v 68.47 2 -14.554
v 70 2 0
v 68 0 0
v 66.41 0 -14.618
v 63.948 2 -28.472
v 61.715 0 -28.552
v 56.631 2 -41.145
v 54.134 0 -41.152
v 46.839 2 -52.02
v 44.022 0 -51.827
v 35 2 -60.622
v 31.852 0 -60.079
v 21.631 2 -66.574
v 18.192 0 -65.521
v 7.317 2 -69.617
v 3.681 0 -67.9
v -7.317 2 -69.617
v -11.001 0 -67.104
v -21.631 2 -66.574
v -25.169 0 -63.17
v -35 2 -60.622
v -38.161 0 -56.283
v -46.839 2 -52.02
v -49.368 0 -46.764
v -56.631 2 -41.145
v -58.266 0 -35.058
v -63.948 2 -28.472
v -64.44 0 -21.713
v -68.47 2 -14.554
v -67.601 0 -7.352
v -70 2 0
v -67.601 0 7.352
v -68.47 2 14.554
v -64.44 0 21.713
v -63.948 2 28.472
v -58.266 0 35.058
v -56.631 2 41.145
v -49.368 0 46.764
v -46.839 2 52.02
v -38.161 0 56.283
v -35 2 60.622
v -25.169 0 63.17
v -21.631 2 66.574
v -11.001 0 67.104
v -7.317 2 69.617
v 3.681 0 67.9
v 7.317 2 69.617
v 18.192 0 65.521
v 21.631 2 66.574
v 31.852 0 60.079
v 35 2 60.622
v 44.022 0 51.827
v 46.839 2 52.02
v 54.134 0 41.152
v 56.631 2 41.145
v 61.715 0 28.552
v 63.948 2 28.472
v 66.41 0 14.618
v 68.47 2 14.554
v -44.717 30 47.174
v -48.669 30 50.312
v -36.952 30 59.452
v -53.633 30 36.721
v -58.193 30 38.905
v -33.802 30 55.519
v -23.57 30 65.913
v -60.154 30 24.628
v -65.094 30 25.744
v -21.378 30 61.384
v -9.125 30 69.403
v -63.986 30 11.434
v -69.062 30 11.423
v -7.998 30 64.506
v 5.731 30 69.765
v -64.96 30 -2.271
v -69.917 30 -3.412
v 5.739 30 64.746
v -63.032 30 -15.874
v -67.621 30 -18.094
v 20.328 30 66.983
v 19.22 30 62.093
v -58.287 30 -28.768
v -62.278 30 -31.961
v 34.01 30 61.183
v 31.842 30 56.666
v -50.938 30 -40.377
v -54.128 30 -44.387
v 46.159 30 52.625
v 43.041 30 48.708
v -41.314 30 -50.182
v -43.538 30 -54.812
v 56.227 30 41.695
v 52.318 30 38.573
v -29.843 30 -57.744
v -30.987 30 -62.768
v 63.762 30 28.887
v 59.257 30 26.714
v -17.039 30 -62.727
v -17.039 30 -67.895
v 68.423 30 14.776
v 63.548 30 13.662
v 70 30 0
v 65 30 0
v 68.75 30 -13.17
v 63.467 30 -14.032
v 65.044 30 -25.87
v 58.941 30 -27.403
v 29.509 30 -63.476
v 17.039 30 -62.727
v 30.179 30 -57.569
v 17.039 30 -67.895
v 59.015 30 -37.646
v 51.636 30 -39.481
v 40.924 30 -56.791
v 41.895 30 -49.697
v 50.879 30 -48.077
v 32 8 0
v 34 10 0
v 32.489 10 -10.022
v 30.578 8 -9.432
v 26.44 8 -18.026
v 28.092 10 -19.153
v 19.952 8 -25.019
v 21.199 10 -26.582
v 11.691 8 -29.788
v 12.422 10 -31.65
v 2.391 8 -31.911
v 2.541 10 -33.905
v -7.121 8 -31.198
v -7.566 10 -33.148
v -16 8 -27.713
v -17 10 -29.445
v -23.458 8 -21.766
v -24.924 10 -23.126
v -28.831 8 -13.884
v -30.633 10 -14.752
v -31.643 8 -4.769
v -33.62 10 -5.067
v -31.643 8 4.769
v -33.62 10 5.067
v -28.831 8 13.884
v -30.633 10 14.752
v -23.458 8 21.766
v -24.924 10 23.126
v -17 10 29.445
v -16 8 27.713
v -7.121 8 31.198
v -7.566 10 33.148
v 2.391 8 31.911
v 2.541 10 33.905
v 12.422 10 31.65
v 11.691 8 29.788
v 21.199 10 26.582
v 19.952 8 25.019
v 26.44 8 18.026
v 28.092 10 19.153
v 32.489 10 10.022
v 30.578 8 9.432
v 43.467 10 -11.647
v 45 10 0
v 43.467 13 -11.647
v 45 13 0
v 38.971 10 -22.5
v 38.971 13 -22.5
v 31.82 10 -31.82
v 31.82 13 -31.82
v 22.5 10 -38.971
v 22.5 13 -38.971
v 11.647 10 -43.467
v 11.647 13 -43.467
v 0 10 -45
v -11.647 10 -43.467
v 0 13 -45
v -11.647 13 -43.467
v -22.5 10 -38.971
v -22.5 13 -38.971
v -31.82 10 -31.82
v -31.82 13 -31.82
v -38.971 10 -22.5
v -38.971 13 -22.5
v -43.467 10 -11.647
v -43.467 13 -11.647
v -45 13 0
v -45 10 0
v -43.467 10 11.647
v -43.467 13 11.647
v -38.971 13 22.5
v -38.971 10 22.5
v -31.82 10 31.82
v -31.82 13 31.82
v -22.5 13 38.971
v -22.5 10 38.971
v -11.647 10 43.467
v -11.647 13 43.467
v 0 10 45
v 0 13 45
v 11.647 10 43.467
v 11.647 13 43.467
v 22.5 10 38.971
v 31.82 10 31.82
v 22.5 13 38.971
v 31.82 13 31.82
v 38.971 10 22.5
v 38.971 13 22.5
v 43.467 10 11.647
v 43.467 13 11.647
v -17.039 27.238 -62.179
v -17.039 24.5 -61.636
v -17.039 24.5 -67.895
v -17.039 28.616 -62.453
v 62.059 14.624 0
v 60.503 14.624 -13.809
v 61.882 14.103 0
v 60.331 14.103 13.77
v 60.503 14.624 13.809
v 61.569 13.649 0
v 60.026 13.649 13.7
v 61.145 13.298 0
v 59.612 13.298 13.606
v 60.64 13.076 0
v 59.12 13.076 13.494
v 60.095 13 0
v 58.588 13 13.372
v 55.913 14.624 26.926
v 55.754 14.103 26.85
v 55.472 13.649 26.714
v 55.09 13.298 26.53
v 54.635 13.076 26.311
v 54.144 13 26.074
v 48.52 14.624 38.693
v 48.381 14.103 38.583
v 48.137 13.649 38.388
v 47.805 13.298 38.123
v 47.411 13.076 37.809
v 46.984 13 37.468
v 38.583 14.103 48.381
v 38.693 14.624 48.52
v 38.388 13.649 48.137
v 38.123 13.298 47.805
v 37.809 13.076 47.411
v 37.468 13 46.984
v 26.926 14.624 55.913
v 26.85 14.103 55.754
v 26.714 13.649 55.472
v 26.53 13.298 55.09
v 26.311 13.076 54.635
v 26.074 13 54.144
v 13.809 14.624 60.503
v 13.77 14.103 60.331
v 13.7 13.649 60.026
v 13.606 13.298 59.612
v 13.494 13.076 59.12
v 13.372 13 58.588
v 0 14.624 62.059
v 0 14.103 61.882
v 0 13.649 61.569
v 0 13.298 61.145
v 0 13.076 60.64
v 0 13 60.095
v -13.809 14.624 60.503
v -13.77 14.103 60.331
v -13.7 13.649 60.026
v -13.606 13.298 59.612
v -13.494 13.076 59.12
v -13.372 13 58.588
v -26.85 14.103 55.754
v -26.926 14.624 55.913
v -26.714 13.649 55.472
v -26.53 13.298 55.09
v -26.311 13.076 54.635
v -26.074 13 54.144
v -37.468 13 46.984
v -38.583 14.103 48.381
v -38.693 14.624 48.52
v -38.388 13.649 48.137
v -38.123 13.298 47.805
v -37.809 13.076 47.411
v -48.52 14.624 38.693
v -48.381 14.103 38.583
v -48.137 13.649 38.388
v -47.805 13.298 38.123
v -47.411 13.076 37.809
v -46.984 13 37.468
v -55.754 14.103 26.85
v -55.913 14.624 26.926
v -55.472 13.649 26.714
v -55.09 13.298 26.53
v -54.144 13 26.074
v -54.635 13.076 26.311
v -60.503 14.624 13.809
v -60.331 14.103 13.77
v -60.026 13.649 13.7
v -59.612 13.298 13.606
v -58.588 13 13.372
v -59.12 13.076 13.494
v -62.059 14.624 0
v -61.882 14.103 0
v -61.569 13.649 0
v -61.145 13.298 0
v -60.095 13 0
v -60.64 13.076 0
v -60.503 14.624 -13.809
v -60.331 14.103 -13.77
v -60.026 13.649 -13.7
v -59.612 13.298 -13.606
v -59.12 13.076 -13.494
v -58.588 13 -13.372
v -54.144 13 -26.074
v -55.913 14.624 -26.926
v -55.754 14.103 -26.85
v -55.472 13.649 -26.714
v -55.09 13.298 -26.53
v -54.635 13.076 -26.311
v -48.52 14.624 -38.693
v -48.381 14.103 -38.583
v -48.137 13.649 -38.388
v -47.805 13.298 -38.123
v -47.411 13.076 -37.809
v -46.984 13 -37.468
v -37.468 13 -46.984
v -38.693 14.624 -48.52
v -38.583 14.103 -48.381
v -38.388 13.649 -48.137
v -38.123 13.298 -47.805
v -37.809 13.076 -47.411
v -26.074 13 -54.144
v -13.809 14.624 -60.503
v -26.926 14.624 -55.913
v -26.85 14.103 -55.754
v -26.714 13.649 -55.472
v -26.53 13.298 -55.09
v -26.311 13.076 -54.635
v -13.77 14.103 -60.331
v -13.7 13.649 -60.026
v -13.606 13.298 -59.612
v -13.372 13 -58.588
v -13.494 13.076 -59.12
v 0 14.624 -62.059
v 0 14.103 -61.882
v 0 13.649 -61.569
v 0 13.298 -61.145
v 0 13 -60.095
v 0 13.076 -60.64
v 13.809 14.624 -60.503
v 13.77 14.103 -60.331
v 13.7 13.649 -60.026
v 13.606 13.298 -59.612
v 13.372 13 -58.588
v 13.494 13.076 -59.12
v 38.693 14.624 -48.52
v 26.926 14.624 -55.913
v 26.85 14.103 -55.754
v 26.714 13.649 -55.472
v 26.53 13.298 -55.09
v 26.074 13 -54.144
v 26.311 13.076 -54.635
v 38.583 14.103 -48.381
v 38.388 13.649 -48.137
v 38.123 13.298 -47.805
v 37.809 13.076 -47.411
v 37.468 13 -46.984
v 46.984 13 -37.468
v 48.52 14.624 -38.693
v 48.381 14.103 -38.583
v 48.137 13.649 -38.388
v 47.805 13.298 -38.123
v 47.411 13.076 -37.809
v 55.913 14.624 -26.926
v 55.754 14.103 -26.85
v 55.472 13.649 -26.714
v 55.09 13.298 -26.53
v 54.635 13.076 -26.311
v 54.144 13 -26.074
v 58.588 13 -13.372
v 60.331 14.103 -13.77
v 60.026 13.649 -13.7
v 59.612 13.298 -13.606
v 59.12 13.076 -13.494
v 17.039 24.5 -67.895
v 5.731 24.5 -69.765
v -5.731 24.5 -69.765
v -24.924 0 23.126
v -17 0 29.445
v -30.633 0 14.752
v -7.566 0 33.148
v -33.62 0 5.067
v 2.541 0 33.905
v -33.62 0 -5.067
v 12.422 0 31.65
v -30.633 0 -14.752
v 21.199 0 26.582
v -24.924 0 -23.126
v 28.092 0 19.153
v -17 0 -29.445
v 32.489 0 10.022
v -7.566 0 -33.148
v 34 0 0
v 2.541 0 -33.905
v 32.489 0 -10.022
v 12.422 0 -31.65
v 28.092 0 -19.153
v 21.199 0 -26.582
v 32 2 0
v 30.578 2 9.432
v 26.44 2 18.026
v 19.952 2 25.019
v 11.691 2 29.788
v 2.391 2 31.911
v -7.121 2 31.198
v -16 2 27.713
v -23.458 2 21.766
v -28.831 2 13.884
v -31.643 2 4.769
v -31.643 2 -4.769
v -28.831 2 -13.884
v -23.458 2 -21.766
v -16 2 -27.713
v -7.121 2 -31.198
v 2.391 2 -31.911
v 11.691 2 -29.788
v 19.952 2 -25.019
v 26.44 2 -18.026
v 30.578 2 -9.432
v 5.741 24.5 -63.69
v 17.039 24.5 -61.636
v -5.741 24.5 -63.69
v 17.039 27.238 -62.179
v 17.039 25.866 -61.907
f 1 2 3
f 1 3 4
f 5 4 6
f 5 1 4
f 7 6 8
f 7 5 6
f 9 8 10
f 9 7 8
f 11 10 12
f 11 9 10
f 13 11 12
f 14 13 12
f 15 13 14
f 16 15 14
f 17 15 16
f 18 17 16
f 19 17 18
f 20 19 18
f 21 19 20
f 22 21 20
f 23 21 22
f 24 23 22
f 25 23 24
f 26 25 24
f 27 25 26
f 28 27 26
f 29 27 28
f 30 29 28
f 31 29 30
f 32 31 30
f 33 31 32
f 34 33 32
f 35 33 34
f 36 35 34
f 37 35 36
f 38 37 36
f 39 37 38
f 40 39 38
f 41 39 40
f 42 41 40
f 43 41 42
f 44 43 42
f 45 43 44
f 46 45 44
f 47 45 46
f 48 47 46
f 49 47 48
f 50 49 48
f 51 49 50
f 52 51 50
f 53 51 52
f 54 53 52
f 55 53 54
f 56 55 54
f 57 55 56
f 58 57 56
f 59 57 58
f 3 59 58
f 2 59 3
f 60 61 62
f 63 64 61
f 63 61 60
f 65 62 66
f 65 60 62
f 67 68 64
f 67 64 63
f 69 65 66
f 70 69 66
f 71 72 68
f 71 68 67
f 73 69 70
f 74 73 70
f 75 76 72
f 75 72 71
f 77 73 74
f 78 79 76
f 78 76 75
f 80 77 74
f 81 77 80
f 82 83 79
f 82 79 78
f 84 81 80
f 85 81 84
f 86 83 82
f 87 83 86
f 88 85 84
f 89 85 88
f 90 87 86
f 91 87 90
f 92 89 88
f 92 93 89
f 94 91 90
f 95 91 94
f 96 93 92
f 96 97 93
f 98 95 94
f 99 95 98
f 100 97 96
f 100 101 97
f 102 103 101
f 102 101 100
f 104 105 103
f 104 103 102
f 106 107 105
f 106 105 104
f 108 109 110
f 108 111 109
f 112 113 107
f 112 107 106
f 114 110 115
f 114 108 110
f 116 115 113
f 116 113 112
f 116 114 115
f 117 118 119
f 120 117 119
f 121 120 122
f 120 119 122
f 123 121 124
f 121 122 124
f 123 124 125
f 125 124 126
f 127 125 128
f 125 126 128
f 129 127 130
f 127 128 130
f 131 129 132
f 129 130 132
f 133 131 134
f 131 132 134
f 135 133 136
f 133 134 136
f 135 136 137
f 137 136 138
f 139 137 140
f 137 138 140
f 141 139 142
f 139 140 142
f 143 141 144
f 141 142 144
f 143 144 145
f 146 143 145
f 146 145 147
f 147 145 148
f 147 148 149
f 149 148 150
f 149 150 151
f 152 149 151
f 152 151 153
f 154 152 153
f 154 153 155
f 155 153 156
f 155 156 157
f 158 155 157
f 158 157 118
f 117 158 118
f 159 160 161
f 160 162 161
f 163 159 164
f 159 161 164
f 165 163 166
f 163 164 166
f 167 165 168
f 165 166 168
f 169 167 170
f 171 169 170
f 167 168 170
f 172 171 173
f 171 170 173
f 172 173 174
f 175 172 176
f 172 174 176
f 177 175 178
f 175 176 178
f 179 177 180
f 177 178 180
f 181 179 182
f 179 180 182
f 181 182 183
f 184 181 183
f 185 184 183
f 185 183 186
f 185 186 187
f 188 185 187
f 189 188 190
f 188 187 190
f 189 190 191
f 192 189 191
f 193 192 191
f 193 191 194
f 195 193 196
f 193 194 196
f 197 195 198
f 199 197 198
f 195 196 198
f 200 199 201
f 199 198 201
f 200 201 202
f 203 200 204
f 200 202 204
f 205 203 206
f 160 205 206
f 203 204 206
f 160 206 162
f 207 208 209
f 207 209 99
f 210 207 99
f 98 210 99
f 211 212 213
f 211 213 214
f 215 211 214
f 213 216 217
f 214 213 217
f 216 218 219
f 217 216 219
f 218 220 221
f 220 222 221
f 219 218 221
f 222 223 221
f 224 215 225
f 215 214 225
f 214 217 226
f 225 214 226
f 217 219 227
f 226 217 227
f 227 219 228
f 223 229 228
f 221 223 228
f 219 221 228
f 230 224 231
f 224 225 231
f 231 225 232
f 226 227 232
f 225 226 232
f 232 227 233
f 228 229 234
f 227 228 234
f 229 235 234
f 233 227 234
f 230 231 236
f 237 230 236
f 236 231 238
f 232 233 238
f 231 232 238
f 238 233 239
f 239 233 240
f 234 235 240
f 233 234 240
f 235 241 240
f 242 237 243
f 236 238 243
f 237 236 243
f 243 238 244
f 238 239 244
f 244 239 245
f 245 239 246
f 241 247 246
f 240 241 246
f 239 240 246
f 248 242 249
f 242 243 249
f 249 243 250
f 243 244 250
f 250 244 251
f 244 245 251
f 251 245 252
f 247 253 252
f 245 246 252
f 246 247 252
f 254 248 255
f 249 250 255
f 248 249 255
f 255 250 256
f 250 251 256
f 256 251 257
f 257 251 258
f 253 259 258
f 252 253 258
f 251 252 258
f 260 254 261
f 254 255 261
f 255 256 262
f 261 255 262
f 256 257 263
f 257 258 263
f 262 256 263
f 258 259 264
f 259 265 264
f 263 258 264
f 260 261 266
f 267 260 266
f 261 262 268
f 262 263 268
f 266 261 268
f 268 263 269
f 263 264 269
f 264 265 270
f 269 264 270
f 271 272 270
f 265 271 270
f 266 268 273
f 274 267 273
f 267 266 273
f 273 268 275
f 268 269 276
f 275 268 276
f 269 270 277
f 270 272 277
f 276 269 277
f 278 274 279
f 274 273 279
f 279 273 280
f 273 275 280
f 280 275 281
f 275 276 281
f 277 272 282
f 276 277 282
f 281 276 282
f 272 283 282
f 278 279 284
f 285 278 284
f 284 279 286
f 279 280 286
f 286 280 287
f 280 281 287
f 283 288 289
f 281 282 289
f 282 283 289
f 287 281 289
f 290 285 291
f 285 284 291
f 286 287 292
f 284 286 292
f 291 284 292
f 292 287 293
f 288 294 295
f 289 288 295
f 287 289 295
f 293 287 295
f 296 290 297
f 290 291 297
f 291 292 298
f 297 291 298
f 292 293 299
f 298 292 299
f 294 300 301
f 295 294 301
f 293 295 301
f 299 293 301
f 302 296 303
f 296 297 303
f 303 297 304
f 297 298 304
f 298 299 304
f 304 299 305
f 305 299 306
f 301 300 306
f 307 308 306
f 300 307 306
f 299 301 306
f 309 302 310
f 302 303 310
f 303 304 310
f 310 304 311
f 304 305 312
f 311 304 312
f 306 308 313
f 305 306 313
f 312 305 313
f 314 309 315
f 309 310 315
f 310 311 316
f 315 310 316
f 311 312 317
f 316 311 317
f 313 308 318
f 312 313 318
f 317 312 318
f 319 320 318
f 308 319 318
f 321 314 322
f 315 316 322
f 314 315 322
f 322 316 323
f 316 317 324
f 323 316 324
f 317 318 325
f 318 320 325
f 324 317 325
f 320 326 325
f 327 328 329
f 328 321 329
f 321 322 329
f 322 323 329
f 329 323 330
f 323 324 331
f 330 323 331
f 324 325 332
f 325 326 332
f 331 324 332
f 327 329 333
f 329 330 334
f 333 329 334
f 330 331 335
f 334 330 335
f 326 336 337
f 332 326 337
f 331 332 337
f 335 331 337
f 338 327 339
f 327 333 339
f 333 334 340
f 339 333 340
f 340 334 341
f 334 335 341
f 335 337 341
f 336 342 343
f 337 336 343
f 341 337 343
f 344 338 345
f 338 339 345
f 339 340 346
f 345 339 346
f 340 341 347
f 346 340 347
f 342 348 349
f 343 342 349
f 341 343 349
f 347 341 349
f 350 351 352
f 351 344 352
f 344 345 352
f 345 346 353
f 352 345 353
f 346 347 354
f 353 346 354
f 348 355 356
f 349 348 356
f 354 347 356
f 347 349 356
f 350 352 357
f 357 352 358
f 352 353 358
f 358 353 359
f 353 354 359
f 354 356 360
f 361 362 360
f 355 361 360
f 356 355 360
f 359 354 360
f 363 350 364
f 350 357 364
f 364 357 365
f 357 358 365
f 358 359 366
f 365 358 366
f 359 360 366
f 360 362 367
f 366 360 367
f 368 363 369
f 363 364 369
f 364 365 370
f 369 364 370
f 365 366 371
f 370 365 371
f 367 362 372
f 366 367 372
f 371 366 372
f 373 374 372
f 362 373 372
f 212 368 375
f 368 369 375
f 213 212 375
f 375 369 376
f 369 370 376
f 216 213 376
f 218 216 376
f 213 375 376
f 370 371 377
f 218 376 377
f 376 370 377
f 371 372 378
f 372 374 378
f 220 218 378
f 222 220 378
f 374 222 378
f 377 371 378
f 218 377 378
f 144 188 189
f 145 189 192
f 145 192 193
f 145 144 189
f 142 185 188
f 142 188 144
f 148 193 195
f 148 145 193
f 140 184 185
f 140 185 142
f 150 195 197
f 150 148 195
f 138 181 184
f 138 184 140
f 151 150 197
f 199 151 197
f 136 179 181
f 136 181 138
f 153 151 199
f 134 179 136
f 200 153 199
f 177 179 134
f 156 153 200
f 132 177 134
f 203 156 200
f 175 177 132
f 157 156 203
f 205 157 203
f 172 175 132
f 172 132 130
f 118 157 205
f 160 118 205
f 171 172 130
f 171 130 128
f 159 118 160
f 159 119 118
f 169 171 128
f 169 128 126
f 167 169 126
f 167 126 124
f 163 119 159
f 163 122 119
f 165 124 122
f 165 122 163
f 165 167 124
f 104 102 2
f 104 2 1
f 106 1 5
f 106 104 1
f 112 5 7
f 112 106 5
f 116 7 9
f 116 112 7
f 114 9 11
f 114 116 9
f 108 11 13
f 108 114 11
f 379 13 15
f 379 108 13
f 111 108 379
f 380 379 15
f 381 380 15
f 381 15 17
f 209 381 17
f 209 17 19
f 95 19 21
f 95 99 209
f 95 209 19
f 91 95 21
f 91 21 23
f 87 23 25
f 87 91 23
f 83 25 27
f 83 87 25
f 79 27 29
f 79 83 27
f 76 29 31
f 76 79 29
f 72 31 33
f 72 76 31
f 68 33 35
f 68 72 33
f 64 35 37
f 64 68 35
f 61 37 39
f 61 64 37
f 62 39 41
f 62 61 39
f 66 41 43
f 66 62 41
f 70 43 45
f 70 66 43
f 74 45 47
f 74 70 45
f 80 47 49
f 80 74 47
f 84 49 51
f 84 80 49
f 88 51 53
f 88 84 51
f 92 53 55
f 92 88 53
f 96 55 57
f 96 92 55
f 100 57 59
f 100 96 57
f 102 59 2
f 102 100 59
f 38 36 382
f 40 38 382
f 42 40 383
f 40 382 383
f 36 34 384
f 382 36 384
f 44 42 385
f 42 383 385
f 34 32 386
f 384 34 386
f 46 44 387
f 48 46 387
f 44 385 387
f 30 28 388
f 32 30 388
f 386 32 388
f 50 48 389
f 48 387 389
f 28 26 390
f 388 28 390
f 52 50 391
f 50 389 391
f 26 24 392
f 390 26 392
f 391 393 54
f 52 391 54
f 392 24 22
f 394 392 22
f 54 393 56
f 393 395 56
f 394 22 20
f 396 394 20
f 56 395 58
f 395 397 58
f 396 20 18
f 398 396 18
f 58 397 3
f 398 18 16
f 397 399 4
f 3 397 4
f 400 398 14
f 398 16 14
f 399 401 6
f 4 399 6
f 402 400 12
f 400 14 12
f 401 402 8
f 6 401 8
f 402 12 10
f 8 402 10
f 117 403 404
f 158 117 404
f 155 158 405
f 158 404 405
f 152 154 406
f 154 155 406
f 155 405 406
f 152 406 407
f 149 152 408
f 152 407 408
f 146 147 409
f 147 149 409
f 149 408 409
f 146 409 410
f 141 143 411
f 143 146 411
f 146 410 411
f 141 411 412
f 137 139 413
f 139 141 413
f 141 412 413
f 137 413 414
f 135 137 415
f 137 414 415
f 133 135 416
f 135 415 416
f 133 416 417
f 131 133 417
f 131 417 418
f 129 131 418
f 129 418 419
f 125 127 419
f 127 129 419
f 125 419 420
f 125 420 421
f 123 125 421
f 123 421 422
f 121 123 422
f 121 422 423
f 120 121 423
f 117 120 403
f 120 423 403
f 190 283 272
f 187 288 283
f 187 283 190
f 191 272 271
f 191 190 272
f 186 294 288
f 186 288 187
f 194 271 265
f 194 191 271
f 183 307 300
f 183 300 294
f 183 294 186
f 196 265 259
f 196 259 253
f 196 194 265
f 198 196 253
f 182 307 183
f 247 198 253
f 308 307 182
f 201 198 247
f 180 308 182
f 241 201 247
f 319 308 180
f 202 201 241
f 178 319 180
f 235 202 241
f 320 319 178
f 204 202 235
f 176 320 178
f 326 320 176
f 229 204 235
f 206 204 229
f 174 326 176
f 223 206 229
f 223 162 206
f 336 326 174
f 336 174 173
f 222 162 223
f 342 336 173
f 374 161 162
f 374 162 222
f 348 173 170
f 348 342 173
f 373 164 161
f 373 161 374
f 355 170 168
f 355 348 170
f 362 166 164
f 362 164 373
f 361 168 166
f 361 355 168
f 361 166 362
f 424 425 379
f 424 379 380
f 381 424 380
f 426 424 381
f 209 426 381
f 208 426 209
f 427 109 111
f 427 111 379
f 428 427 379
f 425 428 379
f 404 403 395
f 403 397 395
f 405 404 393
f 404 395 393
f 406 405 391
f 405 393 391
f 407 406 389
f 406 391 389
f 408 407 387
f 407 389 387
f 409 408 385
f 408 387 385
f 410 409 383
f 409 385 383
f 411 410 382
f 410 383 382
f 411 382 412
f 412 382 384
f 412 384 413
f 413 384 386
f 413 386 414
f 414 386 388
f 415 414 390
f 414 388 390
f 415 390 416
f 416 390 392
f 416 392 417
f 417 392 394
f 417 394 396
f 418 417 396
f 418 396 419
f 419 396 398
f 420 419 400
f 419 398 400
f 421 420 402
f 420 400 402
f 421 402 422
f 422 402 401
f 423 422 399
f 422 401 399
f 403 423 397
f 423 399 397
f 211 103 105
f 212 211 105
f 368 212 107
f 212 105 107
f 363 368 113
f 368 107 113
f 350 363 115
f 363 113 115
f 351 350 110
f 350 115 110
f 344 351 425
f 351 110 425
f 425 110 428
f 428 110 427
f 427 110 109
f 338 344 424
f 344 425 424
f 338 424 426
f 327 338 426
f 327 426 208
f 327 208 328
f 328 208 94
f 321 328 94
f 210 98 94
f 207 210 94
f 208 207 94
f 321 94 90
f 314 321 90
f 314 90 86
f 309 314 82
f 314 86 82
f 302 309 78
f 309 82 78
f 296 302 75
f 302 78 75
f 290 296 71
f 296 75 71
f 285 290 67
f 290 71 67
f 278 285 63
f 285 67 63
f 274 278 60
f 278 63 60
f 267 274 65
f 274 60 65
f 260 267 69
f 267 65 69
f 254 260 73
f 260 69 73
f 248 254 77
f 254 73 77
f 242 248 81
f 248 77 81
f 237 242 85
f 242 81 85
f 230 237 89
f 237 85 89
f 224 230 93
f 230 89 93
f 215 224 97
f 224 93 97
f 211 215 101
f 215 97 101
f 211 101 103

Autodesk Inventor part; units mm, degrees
ref_plane "YZ Plane" through (0, 0, 0) normal (1, 0, 0) x (0, 1, 0)
ref_plane "XZ Plane" through (0, 0, 0) normal (0, 1, 0) x (-1, 0, 0)
ref_plane "XY Plane" through (0, 0, 0) normal (0, 0, 1) x (1, 0, 0)
sketch "Эскиз1" plane through (0, 0, 0) normal (0, 0, 1) x (1, 0, 0)
  line L0 (0, 0) -> (70, 0)
  line L1 (70, 0) -> (70, 30)
  line L2 (70, 30) -> (65, 30)
  line L3 (32, 13) -> (32, 0)
  line L4 (65, 30) -> (61.7485, 13)
  line L5 (0, -6) -> (0, 36) projected
  line L6 (32, 13) -> (61.7485, 13)
  dimension "d0" = 70
  dimension "d1" = 30
  dimension "d2" = 5
  dimension "d16" = 32
revolve "Вращение1" add sketch "Эскиз1" angle 360 about axis through (0, -10, 0) along (0, 1, 0)
sketch "Эскиз2" plane through (0, 13, 0) normal (0, 1, 0) x (1, 0, 0)
  circle A0 centre (0, 0) radius 45
  circle A1 centre (0, 0) radius 32 projected
  dimension "d6" = 90
extrude "Выдавливание1" cut sketch "Эскиз2" against normal blind 3
chamfer "Фаска1" distance 2 angle 45 2 edges at (-32, 10, 0) (-32, 0, 0)
chamfer "Фаска2" distance 2 angle 45 1 edges at (-70, 0, 0)
fillet "Сопряжение1" radius 2 1 edges at (-61.7485, 13, 0)
sketch "Эскиз3" plane through (0, 0, 0) normal (0, 0, 1) x (1, 0, 0)
  line L0 (0, 0) -> (0, -10)
  line L1 (-17.039, 24.5) -> (-17.039, 30)
  line L2 (17.039, 24.5) -> (-17.039, 24.5)
  line L3 (0, -18.3) -> (0, 39.8) projected
  line L4 (0, 30) -> (17.039, 30)
  line L5 (-70, 30) -> (70, 30) projected
  line L6 (17.039, 30) -> (17.039, 24.5)
  line L7 (0, 30) -> (-17.039, 30)
extrude "Выдавливание2" cut sketch "Эскиз3" against normal through all
properties part number "Корпус маслосъемника" material "Чугун, серый"
